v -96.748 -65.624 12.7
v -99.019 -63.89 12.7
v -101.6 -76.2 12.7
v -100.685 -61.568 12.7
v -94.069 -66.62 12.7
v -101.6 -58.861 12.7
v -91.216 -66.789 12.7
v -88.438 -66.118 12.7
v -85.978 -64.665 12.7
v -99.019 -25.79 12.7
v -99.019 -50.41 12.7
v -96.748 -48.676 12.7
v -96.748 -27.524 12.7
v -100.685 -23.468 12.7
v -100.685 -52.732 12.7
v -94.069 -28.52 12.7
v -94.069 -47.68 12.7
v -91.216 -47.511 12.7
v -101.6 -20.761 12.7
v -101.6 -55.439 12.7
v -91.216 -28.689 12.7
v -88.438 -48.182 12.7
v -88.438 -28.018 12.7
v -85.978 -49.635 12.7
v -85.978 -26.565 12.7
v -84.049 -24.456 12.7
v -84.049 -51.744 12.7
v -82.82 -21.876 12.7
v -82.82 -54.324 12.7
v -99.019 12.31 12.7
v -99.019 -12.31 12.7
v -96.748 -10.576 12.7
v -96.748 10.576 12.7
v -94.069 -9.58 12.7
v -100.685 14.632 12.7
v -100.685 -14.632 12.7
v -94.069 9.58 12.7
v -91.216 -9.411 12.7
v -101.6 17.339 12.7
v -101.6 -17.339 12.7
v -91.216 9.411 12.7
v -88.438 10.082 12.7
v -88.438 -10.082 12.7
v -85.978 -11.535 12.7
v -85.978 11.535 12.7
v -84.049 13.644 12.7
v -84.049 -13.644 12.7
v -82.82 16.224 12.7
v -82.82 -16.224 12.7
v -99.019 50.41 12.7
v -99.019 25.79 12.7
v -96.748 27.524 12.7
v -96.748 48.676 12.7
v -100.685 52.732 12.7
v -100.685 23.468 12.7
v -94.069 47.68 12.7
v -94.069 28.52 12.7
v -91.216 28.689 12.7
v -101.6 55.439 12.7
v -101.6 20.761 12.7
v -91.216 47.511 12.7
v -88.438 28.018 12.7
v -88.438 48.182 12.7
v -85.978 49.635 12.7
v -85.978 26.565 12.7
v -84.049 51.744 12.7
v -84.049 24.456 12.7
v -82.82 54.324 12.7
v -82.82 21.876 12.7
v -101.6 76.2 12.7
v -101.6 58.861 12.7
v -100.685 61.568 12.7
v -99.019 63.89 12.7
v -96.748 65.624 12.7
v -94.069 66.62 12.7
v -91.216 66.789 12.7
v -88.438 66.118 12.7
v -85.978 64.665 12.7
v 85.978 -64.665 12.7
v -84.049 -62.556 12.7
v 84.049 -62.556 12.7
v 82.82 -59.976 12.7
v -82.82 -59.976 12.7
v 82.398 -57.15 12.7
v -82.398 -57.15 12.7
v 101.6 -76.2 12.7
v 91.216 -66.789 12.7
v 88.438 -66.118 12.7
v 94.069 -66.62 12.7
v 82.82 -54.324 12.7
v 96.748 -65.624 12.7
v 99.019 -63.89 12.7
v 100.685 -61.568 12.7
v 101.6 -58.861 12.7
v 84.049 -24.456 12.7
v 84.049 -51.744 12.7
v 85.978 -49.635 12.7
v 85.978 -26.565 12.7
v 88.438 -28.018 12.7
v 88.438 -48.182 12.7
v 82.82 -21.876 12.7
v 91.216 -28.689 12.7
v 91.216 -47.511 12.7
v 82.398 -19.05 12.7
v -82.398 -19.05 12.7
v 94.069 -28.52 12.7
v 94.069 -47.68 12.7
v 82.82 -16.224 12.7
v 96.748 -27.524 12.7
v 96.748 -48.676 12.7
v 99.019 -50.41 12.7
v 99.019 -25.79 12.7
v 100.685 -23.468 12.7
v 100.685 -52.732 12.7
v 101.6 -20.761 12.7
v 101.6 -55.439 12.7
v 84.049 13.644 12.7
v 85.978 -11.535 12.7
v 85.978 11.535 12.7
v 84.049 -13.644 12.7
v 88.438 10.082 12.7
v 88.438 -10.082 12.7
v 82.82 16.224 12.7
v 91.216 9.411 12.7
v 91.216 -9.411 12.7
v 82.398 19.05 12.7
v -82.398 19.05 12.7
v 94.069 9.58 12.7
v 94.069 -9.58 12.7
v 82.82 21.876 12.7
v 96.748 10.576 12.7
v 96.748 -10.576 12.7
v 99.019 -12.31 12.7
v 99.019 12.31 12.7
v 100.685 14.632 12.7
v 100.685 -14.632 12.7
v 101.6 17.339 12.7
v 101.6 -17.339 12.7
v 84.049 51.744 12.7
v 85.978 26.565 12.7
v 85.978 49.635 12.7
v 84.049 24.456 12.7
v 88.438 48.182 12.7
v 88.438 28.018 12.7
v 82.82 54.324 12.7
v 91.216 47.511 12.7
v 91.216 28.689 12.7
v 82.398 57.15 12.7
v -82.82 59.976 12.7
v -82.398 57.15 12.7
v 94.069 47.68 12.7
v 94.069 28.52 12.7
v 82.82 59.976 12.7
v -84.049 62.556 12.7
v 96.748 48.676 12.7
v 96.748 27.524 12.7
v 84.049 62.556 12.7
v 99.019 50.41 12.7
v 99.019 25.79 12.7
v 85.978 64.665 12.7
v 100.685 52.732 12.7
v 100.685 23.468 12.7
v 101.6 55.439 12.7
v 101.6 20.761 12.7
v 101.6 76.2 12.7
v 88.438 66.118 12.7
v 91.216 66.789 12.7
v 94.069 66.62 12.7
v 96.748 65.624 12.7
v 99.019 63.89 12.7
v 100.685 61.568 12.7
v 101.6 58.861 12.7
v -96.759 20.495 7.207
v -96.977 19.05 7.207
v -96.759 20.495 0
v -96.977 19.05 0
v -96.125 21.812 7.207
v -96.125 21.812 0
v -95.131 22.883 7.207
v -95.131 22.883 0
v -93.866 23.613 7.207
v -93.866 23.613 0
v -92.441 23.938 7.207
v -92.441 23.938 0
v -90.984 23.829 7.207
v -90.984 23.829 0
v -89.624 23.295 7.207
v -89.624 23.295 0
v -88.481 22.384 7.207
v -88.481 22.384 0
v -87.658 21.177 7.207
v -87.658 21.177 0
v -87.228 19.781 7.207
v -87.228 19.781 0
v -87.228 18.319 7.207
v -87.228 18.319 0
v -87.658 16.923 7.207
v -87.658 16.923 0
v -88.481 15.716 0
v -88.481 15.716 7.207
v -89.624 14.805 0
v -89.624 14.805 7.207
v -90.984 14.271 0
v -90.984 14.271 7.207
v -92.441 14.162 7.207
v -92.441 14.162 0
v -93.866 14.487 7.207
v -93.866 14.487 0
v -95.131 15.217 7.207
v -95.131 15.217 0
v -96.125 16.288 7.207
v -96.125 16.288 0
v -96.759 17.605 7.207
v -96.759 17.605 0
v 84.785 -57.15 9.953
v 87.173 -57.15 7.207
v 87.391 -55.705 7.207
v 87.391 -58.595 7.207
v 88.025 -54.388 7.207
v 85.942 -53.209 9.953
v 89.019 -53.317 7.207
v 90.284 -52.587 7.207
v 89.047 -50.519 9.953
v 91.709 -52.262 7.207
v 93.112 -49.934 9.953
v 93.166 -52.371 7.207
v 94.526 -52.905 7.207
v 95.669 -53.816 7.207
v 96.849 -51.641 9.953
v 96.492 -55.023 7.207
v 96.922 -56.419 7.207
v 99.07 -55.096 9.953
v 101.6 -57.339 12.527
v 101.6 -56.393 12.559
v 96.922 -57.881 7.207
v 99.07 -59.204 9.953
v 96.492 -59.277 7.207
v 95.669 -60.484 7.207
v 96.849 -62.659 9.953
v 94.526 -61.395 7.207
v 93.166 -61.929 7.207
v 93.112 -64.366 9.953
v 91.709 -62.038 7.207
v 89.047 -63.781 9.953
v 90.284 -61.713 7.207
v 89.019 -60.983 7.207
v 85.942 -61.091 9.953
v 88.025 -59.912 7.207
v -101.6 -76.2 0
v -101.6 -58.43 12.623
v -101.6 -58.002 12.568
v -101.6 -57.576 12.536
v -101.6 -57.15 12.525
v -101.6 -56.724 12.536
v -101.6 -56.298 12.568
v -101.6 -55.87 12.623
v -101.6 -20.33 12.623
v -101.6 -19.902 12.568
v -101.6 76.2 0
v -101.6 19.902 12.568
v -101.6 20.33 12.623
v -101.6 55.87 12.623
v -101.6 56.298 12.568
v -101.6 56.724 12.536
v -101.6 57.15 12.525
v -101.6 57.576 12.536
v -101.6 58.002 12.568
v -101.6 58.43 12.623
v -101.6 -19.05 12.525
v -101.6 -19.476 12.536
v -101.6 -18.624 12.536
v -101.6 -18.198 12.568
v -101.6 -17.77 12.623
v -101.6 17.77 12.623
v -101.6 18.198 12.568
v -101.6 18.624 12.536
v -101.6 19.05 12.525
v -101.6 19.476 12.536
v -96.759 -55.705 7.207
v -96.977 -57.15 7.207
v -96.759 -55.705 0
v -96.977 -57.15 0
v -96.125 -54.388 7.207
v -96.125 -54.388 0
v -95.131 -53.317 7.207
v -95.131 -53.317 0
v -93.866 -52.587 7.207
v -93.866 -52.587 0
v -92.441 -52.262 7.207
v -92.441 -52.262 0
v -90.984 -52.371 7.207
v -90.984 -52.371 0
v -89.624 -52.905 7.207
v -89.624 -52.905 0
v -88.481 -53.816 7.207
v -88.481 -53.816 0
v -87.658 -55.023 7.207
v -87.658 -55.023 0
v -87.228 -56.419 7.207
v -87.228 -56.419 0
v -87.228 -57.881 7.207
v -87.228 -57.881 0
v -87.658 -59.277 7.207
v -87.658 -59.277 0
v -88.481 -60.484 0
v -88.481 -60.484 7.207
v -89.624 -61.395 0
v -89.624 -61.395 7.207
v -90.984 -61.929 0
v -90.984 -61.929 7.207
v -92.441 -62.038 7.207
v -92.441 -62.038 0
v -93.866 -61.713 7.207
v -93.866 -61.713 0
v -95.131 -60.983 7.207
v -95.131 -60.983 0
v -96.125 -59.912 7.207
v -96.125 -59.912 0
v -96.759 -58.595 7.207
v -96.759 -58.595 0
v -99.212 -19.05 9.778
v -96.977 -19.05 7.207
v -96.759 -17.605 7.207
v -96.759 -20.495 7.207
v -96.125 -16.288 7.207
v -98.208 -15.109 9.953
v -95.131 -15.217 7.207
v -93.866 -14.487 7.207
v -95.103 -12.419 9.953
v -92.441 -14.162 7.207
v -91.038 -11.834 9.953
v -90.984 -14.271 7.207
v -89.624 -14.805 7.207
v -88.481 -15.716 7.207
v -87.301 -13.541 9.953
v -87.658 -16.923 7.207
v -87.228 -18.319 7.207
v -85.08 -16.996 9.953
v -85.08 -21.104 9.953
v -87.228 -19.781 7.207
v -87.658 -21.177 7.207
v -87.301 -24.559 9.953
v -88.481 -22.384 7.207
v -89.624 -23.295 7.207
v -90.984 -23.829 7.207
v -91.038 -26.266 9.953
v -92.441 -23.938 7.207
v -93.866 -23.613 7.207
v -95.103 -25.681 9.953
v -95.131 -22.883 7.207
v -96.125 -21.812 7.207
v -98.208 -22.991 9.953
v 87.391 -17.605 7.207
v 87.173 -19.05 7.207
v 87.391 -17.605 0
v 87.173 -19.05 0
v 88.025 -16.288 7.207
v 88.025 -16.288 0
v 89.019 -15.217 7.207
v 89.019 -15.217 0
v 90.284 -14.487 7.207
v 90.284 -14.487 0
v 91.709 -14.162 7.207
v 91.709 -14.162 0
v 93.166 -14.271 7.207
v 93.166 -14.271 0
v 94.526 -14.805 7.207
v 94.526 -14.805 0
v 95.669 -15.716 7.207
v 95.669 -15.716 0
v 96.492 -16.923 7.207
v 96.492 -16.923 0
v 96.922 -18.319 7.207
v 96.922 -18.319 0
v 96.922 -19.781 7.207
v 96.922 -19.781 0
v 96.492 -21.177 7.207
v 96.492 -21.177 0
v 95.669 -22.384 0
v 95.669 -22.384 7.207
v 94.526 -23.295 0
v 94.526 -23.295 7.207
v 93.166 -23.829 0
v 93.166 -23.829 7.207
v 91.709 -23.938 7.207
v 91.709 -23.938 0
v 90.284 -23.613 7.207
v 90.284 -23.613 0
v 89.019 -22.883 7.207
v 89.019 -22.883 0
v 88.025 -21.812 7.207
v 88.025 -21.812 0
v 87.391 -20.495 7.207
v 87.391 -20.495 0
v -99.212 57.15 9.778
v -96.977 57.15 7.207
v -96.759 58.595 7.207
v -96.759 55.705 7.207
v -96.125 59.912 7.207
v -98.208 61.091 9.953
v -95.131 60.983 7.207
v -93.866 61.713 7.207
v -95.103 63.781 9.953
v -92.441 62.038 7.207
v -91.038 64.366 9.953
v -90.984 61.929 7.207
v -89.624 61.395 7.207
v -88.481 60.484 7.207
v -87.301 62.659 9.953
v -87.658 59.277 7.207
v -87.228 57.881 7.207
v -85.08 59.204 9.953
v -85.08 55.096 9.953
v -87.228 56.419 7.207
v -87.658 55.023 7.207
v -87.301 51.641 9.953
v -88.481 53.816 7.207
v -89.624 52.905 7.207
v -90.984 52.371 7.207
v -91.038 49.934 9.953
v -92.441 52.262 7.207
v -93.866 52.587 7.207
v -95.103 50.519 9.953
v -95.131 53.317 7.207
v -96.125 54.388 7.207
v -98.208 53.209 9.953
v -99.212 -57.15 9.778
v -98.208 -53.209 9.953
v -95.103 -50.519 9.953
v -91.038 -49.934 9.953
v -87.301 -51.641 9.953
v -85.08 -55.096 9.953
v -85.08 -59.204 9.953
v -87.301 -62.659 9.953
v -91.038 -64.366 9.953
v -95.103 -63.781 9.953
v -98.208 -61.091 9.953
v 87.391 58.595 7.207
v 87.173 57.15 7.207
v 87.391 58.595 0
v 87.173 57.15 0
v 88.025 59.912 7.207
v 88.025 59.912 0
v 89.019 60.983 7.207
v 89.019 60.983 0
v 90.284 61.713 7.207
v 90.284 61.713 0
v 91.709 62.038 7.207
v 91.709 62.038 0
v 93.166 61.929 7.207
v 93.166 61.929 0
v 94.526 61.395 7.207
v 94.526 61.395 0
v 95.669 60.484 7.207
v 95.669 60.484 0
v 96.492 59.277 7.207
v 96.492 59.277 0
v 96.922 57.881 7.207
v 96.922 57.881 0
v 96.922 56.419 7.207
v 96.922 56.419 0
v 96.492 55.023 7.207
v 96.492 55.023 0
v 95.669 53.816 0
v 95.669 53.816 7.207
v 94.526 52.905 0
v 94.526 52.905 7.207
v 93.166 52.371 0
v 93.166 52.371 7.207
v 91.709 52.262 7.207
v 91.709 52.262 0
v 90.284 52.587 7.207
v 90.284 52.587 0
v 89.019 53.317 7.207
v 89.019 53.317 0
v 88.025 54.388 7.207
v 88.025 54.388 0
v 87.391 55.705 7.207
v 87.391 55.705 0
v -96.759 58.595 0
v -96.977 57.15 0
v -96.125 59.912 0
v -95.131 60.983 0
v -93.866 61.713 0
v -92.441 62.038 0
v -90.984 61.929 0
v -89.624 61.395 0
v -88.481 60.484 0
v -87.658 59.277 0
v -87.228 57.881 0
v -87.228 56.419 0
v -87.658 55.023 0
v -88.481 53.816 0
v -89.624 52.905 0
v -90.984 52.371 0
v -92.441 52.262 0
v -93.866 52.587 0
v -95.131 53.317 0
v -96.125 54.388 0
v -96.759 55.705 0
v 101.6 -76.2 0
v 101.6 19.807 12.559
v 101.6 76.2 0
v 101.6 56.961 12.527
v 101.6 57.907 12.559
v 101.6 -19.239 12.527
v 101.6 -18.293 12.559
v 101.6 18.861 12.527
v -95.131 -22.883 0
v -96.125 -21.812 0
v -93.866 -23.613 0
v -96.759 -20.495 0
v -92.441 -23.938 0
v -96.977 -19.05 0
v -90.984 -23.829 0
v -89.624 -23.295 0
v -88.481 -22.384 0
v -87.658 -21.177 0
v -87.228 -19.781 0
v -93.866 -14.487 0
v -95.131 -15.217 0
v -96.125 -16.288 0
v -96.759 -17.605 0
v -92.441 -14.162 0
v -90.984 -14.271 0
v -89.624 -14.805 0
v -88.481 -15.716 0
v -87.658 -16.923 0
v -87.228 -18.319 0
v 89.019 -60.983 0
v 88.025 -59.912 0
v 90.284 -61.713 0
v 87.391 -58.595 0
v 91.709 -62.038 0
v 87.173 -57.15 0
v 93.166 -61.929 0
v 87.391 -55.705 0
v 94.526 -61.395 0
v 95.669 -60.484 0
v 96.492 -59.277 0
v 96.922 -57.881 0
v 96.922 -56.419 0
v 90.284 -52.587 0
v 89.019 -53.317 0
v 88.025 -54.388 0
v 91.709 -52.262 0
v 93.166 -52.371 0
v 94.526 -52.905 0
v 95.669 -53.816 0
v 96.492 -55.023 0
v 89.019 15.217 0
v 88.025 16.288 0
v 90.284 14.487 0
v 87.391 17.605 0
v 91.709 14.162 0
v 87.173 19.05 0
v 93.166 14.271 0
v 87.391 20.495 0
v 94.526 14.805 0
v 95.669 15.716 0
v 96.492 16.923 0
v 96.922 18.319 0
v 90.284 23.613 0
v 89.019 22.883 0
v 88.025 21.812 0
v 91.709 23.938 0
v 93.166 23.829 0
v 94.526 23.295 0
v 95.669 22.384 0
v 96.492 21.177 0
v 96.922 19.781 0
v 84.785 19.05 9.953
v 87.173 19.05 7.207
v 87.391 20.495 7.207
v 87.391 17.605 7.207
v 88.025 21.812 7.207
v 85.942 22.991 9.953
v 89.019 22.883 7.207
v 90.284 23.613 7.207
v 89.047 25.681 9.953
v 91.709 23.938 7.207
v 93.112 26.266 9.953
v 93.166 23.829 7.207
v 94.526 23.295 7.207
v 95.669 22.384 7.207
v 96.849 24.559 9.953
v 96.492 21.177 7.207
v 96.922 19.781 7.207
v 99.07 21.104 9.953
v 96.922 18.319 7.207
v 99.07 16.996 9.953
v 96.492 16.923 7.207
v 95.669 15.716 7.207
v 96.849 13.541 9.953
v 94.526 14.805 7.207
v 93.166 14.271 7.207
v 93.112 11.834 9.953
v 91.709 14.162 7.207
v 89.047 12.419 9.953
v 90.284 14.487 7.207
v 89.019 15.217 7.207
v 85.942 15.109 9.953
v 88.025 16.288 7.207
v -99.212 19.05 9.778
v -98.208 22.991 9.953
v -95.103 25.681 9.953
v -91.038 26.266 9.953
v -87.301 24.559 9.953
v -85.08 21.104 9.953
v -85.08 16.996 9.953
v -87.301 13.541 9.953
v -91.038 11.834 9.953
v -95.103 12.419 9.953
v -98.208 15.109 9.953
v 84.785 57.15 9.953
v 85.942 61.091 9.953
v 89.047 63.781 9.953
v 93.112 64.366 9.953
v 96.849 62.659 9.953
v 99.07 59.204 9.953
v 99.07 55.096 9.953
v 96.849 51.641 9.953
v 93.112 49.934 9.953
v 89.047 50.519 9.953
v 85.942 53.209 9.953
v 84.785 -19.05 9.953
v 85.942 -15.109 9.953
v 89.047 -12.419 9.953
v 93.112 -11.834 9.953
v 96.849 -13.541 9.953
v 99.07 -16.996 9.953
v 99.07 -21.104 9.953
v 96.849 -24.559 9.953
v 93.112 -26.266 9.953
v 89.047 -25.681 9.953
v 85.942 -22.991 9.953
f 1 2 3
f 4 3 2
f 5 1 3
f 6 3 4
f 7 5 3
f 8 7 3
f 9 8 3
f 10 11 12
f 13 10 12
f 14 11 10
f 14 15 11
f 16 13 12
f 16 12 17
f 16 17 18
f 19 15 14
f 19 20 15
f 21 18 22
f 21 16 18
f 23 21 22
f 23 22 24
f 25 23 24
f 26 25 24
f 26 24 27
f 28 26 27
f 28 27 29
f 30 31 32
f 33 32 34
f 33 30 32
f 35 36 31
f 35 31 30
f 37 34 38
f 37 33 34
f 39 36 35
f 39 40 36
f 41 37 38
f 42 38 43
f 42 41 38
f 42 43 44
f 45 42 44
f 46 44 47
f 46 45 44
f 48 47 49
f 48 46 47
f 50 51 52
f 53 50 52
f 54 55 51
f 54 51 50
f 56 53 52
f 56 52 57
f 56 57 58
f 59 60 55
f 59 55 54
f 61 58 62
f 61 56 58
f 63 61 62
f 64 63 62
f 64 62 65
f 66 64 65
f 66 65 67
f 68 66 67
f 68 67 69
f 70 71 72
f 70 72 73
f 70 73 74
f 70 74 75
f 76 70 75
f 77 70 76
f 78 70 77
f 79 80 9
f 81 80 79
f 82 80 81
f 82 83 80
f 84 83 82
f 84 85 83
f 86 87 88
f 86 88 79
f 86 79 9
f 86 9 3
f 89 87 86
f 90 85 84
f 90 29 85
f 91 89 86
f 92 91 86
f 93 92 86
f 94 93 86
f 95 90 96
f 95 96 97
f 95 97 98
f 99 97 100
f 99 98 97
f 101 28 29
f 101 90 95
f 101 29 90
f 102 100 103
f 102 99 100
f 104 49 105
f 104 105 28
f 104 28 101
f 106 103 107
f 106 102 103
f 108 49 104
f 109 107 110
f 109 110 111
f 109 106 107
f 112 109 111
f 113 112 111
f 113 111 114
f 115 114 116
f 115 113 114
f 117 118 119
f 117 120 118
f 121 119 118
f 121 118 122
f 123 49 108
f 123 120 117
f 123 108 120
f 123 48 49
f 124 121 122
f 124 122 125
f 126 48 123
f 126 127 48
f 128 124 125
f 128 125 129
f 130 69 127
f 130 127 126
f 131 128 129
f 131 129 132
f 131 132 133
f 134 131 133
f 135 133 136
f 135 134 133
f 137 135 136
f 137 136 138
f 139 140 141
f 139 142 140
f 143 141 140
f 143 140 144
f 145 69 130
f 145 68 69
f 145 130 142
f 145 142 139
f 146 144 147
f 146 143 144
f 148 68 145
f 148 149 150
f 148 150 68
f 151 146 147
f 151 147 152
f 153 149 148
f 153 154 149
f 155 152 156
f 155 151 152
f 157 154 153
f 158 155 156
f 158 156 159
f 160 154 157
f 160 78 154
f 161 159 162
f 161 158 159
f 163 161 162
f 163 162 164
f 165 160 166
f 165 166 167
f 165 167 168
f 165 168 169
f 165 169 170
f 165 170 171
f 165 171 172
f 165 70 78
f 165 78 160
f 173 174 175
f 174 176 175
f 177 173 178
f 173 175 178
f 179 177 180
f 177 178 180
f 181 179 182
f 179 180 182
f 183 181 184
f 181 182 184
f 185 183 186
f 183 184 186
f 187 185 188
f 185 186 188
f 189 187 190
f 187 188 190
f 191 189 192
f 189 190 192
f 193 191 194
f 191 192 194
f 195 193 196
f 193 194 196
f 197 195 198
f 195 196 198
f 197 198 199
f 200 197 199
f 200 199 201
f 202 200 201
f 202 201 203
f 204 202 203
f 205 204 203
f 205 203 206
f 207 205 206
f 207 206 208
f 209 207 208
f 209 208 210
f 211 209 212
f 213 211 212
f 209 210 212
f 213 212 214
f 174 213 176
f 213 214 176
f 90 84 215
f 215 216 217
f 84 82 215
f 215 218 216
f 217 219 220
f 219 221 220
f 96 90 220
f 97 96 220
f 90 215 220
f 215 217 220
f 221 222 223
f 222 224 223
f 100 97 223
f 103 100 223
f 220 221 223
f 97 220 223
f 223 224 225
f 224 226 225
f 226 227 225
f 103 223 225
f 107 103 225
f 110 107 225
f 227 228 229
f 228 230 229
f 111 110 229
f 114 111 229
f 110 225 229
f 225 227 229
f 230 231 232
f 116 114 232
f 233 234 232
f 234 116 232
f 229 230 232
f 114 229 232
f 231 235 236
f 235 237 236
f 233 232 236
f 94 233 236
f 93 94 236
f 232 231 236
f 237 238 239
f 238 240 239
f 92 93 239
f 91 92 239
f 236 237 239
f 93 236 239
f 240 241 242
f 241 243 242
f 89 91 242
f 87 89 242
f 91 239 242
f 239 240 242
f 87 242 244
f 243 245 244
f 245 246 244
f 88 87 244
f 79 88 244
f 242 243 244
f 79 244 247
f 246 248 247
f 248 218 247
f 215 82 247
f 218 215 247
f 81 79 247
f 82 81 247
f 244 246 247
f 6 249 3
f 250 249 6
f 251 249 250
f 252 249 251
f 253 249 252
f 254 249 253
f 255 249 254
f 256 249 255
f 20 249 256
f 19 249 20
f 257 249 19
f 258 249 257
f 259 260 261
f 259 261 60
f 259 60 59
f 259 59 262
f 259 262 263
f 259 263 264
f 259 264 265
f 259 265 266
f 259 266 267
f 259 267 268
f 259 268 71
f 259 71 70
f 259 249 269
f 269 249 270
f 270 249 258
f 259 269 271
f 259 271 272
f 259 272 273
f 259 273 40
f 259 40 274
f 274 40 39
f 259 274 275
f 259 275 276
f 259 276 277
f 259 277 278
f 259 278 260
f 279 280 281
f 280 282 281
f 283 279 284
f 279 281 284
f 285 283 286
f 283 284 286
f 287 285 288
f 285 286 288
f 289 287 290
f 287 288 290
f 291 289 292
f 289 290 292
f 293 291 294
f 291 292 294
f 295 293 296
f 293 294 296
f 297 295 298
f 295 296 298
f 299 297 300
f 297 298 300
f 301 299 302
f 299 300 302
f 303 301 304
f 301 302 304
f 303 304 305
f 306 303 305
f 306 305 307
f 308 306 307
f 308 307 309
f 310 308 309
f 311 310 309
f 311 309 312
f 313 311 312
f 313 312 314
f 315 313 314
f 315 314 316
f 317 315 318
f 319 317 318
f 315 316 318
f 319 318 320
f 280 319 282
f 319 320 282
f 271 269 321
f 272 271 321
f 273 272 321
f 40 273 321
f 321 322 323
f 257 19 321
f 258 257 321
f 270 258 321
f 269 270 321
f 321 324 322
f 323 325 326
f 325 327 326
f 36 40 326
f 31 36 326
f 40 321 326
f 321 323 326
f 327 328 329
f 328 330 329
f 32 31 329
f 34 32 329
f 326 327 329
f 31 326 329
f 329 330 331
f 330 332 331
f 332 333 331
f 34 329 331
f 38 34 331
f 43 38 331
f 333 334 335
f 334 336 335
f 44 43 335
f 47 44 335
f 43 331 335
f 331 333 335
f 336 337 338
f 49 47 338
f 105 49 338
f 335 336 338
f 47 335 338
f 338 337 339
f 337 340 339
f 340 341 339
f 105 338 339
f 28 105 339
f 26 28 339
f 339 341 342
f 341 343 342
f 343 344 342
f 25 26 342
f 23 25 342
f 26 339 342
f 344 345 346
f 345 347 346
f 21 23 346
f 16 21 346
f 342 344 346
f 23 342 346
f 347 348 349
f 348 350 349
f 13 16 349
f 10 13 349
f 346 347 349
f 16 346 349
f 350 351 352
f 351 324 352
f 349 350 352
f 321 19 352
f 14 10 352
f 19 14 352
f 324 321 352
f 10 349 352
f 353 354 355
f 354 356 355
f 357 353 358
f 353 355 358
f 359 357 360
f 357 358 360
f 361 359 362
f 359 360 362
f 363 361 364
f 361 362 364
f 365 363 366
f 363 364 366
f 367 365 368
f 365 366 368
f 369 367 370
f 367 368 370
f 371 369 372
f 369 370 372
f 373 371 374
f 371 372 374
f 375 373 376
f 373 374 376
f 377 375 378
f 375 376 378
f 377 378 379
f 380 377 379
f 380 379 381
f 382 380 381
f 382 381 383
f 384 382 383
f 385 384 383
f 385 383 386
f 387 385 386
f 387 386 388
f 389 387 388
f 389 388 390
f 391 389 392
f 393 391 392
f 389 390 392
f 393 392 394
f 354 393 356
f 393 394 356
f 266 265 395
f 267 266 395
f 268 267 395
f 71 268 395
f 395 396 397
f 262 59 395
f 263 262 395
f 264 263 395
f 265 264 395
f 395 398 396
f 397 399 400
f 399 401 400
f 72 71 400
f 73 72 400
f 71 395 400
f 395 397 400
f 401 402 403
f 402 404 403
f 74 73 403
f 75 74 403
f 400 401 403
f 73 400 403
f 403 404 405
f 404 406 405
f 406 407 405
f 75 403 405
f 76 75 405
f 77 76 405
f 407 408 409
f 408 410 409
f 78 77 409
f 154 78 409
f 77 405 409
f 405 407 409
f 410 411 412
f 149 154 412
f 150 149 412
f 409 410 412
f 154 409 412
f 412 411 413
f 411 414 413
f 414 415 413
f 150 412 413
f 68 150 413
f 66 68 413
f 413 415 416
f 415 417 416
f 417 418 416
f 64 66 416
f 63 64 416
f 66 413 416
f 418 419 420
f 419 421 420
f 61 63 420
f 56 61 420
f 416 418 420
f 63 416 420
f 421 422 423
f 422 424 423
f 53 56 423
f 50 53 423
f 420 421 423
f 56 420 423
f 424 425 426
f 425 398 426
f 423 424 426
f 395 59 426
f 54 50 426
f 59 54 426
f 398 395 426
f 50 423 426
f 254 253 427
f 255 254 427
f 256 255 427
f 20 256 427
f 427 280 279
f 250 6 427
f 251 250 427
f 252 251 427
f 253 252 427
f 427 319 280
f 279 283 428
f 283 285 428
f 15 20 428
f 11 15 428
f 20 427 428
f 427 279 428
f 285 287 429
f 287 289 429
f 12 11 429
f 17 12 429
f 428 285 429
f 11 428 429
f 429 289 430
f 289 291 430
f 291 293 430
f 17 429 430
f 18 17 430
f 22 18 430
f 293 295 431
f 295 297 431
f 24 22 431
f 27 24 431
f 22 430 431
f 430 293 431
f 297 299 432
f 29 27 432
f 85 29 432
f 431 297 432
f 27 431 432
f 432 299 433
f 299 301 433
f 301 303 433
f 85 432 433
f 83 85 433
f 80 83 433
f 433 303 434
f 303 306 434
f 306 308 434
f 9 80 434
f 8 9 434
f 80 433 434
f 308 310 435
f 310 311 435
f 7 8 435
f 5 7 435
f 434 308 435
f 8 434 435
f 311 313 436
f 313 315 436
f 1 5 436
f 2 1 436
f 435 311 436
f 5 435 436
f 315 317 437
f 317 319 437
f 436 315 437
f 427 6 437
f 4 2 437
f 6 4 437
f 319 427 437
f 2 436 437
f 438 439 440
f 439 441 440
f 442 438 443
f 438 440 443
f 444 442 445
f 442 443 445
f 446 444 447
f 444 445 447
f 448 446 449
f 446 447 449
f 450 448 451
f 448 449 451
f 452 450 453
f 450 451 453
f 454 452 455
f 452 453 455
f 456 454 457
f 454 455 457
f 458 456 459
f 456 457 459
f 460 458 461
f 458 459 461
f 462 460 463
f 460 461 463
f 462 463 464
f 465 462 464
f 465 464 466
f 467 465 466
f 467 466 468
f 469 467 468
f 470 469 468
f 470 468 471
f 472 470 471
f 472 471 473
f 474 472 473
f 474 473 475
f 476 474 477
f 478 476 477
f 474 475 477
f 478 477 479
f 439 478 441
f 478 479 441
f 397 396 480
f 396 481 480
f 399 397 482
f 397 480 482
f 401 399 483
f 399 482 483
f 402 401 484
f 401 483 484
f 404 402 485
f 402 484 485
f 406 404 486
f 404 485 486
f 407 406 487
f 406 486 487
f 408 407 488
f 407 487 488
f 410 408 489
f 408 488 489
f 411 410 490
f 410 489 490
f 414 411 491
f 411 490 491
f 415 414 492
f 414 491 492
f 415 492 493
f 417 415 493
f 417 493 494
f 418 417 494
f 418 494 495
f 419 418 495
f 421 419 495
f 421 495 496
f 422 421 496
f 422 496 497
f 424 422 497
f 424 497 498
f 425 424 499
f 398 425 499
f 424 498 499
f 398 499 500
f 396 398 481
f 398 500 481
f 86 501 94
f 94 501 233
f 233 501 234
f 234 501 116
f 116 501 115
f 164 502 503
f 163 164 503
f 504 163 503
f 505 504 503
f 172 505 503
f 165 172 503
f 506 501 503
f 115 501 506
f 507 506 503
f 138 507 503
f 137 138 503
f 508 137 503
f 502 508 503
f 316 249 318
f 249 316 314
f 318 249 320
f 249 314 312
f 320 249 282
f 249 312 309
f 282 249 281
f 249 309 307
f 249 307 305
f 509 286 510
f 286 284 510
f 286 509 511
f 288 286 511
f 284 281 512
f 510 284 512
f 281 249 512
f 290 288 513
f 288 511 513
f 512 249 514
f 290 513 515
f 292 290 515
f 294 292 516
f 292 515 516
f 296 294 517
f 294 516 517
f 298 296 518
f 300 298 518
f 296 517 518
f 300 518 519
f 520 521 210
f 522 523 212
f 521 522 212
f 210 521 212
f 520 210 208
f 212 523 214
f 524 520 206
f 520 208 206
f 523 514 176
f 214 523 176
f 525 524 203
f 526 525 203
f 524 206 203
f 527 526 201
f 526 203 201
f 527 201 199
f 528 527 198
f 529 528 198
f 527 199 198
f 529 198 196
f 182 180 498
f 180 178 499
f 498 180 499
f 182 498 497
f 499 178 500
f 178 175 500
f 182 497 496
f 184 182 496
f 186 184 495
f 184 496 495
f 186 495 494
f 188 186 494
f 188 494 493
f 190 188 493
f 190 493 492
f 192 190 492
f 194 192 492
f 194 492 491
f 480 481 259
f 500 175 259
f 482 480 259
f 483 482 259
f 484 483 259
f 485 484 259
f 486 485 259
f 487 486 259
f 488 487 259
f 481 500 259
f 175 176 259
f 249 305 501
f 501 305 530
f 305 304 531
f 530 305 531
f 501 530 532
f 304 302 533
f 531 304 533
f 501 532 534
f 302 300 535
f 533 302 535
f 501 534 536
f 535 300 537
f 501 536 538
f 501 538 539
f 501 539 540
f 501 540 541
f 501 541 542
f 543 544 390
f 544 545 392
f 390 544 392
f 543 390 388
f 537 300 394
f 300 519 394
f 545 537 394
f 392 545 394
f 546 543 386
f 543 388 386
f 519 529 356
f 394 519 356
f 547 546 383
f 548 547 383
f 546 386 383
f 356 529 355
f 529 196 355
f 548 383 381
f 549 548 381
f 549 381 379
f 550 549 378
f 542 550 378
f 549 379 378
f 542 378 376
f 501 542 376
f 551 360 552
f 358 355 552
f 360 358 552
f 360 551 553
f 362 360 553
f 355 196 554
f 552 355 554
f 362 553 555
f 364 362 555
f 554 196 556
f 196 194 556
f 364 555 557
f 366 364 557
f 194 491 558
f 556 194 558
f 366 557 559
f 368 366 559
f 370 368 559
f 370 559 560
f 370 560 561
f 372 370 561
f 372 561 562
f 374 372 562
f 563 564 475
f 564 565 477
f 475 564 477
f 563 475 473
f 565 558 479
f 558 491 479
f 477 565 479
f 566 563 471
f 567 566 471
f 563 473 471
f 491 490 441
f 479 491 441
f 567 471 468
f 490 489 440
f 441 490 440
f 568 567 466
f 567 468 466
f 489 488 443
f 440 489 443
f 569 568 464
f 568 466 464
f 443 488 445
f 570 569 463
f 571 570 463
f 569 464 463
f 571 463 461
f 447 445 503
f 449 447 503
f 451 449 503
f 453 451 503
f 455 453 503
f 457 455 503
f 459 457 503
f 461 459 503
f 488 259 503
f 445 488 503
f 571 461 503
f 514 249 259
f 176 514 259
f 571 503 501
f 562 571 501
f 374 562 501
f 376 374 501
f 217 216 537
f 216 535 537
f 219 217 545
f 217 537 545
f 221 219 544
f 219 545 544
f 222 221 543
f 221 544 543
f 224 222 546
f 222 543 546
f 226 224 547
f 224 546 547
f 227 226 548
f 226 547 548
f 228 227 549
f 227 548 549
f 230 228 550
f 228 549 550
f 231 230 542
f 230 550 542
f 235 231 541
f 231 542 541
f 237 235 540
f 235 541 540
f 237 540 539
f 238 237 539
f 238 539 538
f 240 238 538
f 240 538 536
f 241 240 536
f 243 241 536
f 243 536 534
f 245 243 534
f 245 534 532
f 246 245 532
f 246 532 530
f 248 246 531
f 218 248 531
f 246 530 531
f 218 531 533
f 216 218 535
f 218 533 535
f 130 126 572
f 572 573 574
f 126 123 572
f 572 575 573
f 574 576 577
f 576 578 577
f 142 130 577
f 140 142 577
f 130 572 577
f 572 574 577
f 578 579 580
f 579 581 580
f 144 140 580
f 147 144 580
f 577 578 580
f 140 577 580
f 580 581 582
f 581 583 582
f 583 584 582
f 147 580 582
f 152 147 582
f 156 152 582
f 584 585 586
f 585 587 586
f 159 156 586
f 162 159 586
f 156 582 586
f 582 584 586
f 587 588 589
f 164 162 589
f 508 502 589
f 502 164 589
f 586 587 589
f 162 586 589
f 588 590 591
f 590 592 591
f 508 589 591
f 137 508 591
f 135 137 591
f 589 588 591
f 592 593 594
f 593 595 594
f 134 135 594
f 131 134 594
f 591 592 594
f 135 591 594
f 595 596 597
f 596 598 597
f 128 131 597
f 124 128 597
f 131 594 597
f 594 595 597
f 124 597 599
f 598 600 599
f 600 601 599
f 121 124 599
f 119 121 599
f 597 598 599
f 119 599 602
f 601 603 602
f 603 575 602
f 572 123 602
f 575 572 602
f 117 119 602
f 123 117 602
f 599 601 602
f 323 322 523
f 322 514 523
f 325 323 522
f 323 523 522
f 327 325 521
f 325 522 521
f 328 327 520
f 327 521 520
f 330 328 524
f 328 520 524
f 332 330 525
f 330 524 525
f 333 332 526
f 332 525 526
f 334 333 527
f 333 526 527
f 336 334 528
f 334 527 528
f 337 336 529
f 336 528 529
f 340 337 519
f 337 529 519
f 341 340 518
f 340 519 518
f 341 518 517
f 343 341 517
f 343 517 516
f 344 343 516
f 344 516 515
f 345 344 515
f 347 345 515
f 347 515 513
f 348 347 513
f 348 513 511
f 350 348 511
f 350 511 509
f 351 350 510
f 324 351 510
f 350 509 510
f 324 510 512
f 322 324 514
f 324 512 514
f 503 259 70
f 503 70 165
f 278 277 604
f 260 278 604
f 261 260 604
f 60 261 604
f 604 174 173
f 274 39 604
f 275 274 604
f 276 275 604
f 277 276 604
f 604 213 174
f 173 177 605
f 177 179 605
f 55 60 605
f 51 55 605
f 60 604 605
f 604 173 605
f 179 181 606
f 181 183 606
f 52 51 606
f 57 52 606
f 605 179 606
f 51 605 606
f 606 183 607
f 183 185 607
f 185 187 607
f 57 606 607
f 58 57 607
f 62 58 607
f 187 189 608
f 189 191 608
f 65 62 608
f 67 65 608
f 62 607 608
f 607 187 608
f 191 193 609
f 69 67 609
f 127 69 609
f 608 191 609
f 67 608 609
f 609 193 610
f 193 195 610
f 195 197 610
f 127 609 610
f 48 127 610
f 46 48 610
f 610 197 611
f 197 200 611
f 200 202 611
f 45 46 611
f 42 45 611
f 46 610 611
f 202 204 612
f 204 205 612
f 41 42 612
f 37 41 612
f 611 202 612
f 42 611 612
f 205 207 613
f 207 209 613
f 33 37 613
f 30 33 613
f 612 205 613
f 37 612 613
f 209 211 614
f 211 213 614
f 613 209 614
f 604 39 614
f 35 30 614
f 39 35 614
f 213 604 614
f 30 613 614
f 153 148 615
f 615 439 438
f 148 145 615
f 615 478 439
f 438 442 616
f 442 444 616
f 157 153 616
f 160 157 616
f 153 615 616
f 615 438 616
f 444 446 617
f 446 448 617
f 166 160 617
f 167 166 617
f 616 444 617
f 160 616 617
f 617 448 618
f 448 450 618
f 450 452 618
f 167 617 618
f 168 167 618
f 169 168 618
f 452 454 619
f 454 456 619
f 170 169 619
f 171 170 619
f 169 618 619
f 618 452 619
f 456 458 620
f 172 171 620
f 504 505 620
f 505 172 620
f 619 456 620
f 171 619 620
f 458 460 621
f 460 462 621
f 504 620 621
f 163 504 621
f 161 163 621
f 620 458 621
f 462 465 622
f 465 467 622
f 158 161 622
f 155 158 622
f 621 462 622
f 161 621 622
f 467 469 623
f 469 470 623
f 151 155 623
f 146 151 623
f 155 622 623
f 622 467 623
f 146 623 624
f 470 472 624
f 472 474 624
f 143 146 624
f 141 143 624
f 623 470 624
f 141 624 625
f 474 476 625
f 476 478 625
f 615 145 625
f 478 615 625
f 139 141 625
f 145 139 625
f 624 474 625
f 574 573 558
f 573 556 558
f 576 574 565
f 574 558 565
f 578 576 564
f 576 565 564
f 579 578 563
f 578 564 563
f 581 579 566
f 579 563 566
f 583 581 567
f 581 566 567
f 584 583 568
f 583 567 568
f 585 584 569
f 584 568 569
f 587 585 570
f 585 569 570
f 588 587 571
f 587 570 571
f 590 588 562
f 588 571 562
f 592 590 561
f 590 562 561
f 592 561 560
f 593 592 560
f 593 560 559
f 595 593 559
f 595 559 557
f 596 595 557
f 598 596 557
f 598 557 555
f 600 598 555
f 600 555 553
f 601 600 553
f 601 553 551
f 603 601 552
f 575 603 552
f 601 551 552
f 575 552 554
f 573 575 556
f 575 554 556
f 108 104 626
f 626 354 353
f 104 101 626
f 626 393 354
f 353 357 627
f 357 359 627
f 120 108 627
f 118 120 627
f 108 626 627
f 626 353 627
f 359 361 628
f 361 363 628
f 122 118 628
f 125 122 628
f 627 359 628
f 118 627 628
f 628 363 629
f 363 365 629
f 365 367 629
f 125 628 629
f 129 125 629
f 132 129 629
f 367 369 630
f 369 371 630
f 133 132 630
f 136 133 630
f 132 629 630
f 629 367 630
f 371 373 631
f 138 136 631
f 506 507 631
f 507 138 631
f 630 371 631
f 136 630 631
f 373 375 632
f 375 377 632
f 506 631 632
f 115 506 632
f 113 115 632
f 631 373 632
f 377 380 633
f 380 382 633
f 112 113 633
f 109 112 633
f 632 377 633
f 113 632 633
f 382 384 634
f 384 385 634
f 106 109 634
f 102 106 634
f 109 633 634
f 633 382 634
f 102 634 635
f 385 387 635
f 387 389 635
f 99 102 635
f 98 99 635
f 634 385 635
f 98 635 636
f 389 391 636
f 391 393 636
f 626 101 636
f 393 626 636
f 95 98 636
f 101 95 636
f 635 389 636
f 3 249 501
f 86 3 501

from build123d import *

# Parameters (mm, degrees)
SKETCH1_W                                        = 203.2
SKETCH1_H                                        = 152.4
BOSS_EXTRUDE1_DEPTH                              = 12.7
CSK_FOR_3_8_FLAT_HEAD_MACHINE_SCREW1_D           = 9.8044
CSK_FOR_3_8_FLAT_HEAD_MACHINE_SCREW1_CSINK_D     = 19.3548
CSK_FOR_3_8_FLAT_HEAD_MACHINE_SCREW1_CSINK_ANGLE = 82


with BuildPart() as part:
    # Sketch1 → Boss-Extrude1 (new body)
    with BuildSketch(Plane.XY):
        Rectangle(SKETCH1_W, SKETCH1_H)
    extrude(amount=BOSS_EXTRUDE1_DEPTH)

    # CSK for 3/8 Flat Head Machine Screw1 (through all)
    with Locations(Plane.XY.offset(12.7)):
        with Locations((-92.075, 57.15), (-92.075, -57.15), (92.075, -57.15), (92.075, 57.15), (-92.075, 19.05), (92.075, 19.05), (92.075, -19.05), (-92.075, -19.05)):
            CounterSinkHole(CSK_FOR_3_8_FLAT_HEAD_MACHINE_SCREW1_D / 2, CSK_FOR_3_8_FLAT_HEAD_MACHINE_SCREW1_CSINK_D / 2, counter_sink_angle=CSK_FOR_3_8_FLAT_HEAD_MACHINE_SCREW1_CSINK_ANGLE)


solid = part.part
